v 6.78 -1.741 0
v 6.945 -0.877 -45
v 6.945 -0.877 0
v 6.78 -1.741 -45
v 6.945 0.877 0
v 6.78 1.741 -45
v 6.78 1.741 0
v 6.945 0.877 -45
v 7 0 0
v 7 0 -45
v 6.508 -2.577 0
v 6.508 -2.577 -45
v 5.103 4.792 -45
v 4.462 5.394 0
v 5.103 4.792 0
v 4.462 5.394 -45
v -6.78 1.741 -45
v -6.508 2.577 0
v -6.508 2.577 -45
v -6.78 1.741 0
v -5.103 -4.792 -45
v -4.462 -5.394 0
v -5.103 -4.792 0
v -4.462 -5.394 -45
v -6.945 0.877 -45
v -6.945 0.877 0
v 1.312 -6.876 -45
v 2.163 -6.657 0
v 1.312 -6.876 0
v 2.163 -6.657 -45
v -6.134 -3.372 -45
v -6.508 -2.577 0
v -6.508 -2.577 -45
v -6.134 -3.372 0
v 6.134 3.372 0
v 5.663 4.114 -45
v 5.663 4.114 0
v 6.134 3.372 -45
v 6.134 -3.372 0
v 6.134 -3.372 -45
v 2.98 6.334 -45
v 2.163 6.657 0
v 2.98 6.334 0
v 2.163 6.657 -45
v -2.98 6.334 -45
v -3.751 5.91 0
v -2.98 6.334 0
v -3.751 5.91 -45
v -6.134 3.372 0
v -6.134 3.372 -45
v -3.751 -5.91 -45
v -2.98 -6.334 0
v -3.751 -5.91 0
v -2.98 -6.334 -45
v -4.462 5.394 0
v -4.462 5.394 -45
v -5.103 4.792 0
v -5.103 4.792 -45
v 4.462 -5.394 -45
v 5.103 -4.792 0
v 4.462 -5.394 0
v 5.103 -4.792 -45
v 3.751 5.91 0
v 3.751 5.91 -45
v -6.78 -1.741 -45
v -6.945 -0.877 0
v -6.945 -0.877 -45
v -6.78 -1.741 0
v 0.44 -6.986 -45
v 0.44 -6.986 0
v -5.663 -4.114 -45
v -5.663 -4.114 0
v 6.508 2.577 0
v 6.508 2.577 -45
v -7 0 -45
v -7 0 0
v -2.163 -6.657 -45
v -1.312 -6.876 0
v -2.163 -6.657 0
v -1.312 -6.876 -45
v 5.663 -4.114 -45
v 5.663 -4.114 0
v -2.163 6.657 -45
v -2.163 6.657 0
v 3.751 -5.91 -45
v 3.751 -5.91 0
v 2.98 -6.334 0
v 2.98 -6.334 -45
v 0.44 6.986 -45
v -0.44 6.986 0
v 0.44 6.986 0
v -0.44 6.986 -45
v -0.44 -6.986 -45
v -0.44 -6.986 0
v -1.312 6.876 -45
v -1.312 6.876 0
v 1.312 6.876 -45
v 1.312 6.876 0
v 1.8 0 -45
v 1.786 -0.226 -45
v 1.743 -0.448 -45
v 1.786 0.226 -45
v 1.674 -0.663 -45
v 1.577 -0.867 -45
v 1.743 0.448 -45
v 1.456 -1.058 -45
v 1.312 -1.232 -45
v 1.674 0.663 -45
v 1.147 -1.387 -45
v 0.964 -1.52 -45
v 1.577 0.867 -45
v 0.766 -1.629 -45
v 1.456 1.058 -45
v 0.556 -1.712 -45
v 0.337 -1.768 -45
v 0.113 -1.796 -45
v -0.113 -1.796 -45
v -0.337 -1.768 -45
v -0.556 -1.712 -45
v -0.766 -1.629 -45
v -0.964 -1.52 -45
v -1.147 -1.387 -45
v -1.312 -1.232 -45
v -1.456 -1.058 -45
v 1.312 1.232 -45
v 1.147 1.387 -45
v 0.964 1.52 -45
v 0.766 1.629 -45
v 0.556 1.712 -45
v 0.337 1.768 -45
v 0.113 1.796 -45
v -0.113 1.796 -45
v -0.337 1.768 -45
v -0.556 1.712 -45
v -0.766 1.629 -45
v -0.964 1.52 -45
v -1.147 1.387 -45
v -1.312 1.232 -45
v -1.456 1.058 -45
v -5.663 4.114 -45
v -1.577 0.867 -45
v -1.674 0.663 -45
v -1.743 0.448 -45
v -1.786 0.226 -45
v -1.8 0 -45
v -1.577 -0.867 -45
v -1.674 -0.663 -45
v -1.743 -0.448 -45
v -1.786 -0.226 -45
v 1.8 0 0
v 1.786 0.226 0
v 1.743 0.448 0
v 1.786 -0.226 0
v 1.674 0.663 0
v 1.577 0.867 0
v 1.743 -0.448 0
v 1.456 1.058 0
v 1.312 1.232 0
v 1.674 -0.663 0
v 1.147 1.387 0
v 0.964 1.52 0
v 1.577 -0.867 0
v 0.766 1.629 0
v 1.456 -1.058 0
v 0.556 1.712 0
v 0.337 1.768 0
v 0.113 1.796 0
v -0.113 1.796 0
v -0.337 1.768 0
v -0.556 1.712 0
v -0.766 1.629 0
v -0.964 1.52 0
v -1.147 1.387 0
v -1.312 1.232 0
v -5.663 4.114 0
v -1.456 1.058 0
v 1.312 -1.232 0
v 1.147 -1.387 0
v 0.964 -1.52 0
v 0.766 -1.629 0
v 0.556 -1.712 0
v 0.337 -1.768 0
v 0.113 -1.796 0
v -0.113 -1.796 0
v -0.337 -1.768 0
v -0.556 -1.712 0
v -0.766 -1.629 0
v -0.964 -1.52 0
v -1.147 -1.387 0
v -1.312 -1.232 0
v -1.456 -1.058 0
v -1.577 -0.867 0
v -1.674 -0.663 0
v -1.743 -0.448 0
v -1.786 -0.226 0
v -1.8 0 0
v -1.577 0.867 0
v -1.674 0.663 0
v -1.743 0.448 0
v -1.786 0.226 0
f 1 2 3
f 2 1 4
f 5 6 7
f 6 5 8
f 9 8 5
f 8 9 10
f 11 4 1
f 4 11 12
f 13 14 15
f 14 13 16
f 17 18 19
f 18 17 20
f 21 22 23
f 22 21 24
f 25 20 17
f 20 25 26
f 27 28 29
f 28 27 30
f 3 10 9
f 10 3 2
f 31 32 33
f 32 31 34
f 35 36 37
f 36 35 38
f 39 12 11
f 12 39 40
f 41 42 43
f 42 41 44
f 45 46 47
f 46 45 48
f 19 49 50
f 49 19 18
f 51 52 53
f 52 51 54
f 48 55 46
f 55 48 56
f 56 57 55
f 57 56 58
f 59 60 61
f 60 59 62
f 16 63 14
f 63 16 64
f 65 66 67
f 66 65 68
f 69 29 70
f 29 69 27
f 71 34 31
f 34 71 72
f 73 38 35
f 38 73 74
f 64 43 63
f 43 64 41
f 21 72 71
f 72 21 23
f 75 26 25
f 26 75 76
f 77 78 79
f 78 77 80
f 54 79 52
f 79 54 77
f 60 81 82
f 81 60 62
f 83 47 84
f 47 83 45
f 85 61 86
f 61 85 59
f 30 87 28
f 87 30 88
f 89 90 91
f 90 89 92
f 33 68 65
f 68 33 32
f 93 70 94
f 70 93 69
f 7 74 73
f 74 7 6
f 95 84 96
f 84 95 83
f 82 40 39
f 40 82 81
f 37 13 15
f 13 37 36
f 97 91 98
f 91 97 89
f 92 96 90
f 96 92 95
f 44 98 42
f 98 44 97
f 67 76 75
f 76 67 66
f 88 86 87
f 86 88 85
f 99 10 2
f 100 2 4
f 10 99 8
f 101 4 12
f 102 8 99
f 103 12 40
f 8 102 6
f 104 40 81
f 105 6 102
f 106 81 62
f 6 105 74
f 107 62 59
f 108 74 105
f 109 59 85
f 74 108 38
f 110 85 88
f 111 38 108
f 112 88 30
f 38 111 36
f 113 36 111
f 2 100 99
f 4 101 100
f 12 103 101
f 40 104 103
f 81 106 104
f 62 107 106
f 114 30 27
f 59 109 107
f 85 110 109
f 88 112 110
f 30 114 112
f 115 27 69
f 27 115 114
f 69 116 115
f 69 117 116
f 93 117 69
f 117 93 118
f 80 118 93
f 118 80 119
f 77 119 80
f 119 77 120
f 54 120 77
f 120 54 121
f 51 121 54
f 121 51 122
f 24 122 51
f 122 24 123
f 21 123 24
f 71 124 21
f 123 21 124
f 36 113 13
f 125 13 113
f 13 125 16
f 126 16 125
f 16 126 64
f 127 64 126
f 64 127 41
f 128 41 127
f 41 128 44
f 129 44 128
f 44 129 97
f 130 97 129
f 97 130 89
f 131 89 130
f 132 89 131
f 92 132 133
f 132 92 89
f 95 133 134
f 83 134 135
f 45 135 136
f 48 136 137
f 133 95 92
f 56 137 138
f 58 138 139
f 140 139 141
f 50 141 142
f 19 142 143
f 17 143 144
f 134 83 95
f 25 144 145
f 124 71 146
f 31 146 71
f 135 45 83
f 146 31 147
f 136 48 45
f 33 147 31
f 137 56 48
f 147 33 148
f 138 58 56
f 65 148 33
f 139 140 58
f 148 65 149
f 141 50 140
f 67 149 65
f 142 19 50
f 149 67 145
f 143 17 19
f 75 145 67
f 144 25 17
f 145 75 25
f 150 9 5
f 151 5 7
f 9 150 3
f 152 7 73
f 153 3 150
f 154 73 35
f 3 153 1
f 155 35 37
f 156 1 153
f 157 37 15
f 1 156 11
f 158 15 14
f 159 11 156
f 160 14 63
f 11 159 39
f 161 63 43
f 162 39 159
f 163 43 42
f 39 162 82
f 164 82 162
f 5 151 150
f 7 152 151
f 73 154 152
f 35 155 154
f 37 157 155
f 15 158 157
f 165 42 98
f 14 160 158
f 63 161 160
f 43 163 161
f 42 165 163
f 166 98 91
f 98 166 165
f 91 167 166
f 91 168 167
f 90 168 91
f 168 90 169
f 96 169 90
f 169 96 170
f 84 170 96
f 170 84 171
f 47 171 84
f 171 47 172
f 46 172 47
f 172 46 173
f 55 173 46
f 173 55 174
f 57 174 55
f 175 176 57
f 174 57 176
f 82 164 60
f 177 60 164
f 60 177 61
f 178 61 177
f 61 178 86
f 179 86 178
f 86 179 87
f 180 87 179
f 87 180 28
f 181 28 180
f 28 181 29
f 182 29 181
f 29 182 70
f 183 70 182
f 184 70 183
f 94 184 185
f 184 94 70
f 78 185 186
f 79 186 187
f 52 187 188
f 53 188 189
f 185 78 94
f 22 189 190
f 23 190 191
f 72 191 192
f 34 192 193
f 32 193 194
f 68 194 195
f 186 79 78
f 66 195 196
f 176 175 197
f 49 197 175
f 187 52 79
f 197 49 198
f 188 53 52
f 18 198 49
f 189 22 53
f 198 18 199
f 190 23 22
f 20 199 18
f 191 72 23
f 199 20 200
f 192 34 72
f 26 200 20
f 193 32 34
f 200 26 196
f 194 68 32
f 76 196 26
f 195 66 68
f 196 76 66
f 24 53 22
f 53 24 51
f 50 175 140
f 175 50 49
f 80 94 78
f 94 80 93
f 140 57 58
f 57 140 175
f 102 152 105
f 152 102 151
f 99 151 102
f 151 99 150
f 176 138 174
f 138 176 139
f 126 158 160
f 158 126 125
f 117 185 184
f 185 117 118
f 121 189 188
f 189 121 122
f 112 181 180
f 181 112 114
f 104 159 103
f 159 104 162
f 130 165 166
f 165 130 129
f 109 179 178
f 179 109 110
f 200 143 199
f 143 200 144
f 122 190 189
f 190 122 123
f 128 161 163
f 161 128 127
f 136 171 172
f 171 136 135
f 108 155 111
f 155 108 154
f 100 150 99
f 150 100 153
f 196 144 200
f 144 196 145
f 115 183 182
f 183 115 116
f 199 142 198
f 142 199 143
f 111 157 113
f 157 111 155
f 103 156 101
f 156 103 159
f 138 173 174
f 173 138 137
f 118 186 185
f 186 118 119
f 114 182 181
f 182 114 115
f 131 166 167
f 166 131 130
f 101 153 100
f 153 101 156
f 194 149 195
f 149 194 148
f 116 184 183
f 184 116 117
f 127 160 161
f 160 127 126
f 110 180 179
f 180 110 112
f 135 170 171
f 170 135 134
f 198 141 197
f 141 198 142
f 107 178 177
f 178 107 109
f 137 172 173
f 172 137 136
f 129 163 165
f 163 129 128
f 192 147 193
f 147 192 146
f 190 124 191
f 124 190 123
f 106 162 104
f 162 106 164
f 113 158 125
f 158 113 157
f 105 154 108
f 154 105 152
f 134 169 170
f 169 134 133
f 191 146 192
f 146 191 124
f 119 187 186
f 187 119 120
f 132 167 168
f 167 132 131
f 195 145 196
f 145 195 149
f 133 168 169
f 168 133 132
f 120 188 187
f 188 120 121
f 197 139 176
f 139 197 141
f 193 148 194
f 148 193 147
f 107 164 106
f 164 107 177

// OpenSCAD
$fn = 50;


difference() {
	union() {
		translate(v = [0, 0, -45.0000000000]) {
			cylinder(h = 45, r = 7.0000000000);
		}
		cylinder(h = 0, r = 17.0000000000);
	}
	union() {
		#translate(v = [0, 0, -45]) {
			cylinder(h = 45, r = 1.8000000000);
		}
	}
}
